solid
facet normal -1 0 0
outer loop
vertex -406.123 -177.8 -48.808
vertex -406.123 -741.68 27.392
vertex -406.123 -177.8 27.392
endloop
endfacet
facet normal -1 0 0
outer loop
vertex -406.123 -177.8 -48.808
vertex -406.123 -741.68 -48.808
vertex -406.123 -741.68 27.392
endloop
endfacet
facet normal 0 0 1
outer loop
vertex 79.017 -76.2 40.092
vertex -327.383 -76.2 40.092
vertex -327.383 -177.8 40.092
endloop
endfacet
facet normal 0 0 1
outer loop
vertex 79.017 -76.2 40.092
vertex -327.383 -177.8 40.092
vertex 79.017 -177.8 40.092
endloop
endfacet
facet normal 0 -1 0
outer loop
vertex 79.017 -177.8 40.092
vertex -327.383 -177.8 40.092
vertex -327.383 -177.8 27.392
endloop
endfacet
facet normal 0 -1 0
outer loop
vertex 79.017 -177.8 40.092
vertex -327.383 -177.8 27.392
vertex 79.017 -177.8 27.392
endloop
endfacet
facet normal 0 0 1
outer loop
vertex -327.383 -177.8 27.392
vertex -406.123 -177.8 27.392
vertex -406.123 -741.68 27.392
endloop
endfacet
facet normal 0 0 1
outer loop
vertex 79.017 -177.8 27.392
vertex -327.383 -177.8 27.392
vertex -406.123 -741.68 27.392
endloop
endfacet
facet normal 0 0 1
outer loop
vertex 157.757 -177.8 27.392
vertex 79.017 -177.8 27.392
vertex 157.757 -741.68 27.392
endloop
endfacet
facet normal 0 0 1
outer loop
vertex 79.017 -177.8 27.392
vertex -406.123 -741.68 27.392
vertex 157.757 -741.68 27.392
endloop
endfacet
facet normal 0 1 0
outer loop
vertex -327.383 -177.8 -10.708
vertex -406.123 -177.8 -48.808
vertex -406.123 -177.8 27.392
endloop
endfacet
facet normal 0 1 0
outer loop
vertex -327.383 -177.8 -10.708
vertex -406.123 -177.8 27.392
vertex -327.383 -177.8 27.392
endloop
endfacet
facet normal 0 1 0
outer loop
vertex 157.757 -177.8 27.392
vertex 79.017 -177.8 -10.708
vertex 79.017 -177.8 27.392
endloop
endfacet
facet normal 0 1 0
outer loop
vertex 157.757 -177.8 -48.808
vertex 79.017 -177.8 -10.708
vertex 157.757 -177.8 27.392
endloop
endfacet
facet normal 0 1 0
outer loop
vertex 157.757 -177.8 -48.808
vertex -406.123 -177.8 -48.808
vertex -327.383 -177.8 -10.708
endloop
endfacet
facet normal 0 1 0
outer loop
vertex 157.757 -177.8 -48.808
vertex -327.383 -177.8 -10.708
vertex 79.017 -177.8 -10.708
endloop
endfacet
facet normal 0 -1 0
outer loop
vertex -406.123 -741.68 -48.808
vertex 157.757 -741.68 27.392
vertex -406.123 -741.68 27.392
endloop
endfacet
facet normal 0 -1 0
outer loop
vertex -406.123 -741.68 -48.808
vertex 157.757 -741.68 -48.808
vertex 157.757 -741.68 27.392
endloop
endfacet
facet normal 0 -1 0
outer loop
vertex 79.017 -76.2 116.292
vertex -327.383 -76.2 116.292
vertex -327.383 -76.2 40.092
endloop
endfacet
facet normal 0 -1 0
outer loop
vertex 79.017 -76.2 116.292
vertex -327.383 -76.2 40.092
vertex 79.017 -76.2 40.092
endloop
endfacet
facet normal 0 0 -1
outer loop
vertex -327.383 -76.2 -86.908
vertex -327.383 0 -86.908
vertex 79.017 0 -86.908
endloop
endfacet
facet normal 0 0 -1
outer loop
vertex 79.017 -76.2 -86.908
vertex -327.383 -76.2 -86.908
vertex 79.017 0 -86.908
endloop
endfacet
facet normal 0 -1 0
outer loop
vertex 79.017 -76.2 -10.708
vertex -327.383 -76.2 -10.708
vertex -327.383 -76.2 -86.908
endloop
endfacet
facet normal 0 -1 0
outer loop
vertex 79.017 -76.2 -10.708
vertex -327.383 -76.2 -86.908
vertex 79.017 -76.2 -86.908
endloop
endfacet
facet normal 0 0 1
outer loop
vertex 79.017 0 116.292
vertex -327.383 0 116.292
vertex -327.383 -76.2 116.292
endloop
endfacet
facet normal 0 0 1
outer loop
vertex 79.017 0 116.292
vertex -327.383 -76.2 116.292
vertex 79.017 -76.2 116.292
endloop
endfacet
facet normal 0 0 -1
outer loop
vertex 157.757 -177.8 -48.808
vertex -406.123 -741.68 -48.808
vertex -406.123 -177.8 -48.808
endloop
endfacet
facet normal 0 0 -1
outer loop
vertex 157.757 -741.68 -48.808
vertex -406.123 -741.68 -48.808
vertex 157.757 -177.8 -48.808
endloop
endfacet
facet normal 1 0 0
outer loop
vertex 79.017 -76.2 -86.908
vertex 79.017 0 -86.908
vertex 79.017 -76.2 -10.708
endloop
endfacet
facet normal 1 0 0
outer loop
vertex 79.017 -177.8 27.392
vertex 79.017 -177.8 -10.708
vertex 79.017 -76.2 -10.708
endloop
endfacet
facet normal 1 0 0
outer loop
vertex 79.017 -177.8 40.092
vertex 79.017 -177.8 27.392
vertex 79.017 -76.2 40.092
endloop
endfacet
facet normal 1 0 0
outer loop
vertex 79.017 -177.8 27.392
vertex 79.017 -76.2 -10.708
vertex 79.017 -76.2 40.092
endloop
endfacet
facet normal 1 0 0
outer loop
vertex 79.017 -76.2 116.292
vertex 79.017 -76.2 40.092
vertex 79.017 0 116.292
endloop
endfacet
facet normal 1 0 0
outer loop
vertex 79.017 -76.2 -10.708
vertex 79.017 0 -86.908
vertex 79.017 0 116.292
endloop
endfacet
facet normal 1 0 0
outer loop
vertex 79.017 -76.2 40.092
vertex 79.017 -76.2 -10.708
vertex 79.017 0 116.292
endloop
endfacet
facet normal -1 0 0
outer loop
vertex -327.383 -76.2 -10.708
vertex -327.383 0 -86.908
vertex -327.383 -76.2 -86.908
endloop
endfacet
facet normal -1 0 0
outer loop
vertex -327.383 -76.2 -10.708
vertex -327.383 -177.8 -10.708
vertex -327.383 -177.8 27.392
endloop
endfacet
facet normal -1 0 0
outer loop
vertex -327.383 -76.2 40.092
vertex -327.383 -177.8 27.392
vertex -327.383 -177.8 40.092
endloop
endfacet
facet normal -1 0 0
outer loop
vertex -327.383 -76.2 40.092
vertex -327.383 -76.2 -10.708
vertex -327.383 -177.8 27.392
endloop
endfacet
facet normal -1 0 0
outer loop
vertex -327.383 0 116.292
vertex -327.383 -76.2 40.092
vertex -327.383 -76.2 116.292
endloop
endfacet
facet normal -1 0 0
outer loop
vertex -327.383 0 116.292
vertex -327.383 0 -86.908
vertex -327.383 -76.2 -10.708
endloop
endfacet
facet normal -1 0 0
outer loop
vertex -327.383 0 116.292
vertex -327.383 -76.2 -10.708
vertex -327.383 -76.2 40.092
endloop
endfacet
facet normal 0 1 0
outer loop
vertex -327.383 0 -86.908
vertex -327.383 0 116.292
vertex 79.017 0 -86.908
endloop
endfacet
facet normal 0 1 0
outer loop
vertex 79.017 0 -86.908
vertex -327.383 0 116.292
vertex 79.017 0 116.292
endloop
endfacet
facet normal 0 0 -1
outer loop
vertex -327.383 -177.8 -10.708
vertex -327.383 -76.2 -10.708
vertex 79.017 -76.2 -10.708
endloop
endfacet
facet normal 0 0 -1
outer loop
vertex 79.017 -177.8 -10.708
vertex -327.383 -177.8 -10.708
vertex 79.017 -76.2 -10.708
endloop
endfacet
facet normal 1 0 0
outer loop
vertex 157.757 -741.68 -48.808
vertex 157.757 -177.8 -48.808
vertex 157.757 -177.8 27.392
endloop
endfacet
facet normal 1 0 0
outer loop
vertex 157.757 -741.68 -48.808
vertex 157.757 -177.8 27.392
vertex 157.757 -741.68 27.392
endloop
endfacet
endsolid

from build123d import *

# Parameters (mm, degrees)
F0_W     = 406.4
F0_H     = 203.2
F1_DEPTH = 76.2
F2_W     = 406.4
F2_H     = 50.8
F3_DEPTH = 101.6
F5_DEPTH = 38.1


with BuildPart() as f1:
    # F0 (on Front) → F1 (new body)
    with BuildSketch(Plane.XZ):
        with Locations((-124.183113, 14.692131)):
            Rectangle(F0_W, F0_H)
    extrude(amount=F1_DEPTH)

    # F2 (on face) → F3 (join)
    with BuildSketch(Plane.XZ.offset(76.2)):
        with Locations((-124.183113, 14.692131)):
            Rectangle(F2_W, F2_H)
    extrude(amount=F3_DEPTH)

    # F4 (on face) → F5 (join, symmetric)
    with BuildSketch(Plane(origin=(0, 0, -10.707869), x_dir=(1, 0, 0), z_dir=(0, 0, -1))):
        Polygon((-406.123113, 741.68), (-406.123113, 177.8), (-327.383113, 177.8), (79.016887, 177.8), (157.756887, 177.8), (157.756887, 741.68), align=None)
    extrude(amount=F5_DEPTH, both=True)


solid = f1.part
